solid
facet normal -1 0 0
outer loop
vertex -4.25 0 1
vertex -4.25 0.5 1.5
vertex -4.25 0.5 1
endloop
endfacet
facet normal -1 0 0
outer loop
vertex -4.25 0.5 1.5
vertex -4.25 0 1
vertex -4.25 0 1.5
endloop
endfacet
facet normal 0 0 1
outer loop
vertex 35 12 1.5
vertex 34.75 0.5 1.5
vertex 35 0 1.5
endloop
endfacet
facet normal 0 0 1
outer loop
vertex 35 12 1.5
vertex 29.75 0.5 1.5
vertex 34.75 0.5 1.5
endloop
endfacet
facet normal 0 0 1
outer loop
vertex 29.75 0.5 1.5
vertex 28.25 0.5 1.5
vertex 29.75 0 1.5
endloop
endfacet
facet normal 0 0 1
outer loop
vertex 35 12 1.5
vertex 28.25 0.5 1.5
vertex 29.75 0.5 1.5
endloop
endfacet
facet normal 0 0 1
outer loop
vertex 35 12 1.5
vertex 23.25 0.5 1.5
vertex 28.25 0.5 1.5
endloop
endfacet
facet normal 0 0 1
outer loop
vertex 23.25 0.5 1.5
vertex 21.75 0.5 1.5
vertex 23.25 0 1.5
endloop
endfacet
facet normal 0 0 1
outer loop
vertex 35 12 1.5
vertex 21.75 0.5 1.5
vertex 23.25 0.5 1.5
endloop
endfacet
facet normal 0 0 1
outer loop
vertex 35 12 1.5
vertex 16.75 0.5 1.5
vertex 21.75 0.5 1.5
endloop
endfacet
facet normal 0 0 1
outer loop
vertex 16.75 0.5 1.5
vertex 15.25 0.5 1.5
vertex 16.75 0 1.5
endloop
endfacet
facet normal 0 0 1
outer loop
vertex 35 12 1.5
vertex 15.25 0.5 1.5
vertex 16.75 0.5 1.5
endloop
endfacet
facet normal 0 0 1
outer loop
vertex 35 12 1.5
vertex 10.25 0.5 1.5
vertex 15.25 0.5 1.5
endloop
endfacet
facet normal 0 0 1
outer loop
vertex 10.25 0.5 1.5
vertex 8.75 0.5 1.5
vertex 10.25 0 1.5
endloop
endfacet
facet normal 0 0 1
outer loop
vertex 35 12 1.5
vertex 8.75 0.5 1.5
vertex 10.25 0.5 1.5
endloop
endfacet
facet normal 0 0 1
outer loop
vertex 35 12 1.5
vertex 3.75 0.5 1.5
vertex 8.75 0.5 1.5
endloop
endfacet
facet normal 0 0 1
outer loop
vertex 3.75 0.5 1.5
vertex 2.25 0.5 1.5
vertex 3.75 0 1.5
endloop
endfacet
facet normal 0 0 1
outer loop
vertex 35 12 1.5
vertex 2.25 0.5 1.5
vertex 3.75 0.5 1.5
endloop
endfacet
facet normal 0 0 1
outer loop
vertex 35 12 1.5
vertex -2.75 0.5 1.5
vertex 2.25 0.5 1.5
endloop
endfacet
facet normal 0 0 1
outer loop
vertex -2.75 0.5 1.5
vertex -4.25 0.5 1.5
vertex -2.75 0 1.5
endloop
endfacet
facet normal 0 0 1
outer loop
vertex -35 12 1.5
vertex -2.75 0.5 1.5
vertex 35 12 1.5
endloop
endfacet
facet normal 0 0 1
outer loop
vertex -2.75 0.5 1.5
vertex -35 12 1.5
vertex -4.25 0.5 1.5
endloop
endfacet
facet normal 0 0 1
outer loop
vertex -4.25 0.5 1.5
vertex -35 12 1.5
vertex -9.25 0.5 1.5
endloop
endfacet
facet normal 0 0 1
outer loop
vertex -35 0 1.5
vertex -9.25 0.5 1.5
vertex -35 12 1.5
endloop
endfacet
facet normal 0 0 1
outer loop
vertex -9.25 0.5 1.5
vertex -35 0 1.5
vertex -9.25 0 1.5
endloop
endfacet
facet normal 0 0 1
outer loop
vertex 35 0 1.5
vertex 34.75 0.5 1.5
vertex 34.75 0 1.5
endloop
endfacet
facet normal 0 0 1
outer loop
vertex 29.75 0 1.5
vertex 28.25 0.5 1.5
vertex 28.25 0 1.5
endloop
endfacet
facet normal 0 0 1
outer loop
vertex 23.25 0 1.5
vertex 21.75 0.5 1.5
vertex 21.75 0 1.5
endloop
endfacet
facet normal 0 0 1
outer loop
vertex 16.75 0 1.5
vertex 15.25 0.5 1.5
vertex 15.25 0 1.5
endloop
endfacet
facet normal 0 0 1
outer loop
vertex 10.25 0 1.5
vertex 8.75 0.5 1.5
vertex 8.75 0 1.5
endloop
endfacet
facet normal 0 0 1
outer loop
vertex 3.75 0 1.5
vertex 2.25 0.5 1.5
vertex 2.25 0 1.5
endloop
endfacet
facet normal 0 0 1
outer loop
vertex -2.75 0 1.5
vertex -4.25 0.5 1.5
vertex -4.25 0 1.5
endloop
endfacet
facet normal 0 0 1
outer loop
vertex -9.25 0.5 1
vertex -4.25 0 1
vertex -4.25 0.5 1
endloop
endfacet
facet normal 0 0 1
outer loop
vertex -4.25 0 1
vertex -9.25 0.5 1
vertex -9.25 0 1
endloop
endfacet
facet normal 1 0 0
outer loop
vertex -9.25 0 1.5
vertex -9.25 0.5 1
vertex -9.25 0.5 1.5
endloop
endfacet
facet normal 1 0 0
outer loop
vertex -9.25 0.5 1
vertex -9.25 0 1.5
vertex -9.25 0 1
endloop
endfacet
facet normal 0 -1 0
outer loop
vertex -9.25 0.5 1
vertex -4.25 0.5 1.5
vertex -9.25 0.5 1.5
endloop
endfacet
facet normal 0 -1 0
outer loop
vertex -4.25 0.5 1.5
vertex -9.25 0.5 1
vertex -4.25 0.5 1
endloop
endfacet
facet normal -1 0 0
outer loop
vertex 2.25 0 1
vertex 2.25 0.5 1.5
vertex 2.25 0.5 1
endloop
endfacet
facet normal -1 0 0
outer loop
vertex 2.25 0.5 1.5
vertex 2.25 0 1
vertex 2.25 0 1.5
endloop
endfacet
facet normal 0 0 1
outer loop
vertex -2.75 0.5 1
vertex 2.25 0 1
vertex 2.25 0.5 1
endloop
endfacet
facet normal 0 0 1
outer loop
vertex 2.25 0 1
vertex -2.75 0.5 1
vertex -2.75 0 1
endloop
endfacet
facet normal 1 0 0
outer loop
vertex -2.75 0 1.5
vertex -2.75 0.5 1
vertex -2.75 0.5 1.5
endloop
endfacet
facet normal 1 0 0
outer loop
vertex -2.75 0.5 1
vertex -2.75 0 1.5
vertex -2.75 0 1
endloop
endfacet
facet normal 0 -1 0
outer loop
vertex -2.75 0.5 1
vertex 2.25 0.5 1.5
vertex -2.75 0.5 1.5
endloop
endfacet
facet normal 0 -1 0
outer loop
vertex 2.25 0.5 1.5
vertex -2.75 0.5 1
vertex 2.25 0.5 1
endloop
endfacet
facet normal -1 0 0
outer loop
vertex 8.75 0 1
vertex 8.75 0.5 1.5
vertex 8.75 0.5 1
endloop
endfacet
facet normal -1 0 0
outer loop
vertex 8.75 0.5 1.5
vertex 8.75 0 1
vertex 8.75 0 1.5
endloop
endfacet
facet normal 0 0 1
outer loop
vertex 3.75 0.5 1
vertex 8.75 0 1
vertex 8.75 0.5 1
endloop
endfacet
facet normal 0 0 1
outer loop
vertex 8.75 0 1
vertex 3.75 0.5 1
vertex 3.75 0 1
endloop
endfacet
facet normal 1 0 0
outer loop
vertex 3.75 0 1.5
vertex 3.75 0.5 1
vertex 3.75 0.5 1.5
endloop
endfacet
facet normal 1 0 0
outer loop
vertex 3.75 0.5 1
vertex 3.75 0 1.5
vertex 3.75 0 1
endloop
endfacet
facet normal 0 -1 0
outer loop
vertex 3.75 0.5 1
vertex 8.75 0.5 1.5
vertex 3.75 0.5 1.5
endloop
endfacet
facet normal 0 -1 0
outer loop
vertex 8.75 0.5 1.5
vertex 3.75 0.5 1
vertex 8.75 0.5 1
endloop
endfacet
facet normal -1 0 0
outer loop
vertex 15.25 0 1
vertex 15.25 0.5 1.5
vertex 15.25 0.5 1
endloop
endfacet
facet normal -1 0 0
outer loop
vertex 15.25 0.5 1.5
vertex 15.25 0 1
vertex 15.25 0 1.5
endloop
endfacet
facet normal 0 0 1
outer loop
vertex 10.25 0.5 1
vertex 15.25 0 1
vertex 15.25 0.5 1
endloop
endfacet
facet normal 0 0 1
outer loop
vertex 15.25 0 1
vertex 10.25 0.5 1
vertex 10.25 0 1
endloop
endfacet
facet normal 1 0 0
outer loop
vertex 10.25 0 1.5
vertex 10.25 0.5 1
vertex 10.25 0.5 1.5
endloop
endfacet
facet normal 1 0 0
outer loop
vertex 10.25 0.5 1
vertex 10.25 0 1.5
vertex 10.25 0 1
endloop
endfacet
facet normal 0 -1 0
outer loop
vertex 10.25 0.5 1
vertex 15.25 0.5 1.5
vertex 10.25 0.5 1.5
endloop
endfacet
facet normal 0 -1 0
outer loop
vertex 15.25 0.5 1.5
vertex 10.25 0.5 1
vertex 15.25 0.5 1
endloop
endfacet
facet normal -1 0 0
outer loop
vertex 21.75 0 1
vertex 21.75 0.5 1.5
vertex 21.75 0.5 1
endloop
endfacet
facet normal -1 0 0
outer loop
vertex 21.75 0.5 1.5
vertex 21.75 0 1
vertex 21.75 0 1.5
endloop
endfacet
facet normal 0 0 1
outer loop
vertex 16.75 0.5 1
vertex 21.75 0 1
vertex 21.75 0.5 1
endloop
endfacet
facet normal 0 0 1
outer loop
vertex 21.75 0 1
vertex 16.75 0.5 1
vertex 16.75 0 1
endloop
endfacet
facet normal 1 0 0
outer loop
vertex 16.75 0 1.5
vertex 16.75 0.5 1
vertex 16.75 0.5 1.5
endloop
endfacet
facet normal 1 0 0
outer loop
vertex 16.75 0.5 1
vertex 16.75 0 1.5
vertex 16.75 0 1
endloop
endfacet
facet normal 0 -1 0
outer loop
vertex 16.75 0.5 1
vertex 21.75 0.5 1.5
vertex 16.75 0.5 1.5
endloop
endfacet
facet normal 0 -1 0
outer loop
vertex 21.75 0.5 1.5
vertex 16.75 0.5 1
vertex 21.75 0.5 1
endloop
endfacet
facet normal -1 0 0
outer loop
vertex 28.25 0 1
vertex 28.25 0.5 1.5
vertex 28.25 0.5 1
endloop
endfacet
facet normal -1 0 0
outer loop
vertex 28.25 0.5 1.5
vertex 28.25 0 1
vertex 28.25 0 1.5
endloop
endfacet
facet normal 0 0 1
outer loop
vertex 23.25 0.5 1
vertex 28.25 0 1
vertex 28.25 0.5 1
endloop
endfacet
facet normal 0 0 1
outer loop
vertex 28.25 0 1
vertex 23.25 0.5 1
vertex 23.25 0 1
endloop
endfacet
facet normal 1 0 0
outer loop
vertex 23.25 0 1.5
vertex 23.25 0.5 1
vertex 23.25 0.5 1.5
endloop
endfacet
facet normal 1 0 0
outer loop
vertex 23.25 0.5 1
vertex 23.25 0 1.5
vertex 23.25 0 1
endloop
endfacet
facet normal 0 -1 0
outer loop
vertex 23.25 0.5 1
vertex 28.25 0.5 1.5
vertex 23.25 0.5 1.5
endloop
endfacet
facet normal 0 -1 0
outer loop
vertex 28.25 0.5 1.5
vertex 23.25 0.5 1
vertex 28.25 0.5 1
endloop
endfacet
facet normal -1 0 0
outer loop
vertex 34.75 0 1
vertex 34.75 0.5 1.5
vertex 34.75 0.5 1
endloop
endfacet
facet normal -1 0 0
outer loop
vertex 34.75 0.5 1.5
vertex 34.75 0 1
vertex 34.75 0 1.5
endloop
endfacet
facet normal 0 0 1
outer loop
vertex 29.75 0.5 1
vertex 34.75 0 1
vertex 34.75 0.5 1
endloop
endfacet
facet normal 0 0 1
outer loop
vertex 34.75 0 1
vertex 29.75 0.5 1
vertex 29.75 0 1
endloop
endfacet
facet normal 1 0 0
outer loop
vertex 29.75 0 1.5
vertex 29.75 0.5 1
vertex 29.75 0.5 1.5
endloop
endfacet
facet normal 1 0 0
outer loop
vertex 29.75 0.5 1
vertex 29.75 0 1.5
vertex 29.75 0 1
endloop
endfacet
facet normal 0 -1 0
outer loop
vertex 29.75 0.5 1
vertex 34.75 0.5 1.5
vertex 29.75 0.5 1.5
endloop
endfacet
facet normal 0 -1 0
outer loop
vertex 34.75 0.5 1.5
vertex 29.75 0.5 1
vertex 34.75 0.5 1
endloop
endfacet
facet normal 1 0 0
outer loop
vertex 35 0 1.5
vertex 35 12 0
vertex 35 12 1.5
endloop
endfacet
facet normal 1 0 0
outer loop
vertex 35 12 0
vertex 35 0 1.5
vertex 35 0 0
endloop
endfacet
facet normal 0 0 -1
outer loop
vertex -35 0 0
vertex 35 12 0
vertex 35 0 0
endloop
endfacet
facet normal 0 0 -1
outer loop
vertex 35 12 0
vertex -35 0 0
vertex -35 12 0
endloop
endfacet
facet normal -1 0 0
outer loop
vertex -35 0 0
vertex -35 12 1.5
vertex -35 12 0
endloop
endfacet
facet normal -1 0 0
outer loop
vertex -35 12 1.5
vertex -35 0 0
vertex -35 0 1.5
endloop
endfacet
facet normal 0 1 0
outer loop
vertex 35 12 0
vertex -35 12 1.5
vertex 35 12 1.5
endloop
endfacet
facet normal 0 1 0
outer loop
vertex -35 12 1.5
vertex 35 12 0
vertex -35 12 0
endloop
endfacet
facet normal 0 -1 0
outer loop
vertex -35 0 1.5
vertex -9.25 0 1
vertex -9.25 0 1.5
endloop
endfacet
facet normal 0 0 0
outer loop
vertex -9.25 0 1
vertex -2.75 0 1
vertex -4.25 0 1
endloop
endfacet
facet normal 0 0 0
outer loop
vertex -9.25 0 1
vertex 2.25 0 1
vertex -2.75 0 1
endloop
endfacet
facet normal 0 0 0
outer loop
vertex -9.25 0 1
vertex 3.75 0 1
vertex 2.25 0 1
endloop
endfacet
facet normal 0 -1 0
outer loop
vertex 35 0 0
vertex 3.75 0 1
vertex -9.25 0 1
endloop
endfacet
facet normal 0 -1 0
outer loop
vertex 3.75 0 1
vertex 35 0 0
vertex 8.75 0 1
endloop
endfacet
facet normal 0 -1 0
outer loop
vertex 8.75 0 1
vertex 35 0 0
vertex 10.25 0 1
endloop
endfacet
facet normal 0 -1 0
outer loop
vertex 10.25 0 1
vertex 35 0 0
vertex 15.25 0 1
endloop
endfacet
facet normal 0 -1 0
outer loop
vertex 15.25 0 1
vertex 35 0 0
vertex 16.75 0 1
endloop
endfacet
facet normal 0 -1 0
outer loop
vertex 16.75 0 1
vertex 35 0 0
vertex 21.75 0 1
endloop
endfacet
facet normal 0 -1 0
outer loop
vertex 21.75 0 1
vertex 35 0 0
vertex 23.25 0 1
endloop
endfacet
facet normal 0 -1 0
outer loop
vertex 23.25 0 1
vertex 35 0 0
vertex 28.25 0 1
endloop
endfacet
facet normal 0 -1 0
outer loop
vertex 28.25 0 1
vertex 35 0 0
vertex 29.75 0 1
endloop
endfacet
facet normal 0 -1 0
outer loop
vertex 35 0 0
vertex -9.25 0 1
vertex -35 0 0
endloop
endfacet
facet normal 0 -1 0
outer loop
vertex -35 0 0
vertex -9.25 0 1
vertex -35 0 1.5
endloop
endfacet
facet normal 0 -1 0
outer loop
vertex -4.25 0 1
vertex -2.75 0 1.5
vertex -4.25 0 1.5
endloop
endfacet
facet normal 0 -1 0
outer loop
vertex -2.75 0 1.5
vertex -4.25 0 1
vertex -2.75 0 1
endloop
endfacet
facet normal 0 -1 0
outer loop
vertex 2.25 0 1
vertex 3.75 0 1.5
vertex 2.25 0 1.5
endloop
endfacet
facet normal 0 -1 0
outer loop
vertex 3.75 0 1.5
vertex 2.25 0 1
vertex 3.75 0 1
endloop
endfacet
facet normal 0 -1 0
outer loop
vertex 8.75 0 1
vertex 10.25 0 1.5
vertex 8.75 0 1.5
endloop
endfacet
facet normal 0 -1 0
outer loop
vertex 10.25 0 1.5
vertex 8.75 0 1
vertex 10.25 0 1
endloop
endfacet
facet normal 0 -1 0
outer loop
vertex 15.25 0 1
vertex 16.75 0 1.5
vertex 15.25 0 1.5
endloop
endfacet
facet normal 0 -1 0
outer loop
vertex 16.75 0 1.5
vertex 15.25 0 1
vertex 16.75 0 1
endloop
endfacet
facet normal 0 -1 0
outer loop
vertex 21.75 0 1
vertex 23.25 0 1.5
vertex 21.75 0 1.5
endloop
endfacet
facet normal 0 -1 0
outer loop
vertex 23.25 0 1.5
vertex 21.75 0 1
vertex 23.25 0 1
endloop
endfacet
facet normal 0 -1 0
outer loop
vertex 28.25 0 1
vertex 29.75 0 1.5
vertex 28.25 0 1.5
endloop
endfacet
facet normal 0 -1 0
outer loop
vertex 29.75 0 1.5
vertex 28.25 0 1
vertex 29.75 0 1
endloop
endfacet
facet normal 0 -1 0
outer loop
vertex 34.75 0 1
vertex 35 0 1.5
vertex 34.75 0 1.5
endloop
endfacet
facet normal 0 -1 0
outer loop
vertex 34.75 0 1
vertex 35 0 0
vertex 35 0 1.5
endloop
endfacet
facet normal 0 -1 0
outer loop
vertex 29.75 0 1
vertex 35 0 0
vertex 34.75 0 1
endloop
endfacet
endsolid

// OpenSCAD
// 10-well comb for agarose gel casting, printed flat on the bed
// Units: mm

// ---- Spine ----
spine_len   = 70;    // spine length along X
spine_wid   = 12;    // spine width along Y
spine_thk   = 1.5;   // spine thickness along Z

// ---- Teeth ----
tooth_count = 10;    // number of wells/teeth
tooth_w     = 5.0;   // tooth width along X
tooth_l     = 12;    // tooth length along Y (hangs in -Y)
tooth_gap   = 1.5;   // gap between neighbouring teeth along X

// ---- Misc ----
eps         = 0.5;   // cutter overshoot past faces
$fn         = 64;

// Derived
pitch       = tooth_w + tooth_gap;          // centre-to-centre spacing
row_span    = (tooth_count - 1) * tooth_gap; // total gap width
x_start     = -row_span / 2;                // centre row on spine

difference() {
    // Spine (back bar)
    translate([-spine_len / 2, 0, 0])
        cube([spine_len, spine_wid, spine_thk]);

    // Teeth cut out from the top face
    for (i = [0 : tooth_count - 1])
        translate([x_start + i * pitch - tooth_w / 2,
                   -tooth_l,
                   spine_thk - eps])
            cube([tooth_w, tooth_l + eps, eps]);
}
